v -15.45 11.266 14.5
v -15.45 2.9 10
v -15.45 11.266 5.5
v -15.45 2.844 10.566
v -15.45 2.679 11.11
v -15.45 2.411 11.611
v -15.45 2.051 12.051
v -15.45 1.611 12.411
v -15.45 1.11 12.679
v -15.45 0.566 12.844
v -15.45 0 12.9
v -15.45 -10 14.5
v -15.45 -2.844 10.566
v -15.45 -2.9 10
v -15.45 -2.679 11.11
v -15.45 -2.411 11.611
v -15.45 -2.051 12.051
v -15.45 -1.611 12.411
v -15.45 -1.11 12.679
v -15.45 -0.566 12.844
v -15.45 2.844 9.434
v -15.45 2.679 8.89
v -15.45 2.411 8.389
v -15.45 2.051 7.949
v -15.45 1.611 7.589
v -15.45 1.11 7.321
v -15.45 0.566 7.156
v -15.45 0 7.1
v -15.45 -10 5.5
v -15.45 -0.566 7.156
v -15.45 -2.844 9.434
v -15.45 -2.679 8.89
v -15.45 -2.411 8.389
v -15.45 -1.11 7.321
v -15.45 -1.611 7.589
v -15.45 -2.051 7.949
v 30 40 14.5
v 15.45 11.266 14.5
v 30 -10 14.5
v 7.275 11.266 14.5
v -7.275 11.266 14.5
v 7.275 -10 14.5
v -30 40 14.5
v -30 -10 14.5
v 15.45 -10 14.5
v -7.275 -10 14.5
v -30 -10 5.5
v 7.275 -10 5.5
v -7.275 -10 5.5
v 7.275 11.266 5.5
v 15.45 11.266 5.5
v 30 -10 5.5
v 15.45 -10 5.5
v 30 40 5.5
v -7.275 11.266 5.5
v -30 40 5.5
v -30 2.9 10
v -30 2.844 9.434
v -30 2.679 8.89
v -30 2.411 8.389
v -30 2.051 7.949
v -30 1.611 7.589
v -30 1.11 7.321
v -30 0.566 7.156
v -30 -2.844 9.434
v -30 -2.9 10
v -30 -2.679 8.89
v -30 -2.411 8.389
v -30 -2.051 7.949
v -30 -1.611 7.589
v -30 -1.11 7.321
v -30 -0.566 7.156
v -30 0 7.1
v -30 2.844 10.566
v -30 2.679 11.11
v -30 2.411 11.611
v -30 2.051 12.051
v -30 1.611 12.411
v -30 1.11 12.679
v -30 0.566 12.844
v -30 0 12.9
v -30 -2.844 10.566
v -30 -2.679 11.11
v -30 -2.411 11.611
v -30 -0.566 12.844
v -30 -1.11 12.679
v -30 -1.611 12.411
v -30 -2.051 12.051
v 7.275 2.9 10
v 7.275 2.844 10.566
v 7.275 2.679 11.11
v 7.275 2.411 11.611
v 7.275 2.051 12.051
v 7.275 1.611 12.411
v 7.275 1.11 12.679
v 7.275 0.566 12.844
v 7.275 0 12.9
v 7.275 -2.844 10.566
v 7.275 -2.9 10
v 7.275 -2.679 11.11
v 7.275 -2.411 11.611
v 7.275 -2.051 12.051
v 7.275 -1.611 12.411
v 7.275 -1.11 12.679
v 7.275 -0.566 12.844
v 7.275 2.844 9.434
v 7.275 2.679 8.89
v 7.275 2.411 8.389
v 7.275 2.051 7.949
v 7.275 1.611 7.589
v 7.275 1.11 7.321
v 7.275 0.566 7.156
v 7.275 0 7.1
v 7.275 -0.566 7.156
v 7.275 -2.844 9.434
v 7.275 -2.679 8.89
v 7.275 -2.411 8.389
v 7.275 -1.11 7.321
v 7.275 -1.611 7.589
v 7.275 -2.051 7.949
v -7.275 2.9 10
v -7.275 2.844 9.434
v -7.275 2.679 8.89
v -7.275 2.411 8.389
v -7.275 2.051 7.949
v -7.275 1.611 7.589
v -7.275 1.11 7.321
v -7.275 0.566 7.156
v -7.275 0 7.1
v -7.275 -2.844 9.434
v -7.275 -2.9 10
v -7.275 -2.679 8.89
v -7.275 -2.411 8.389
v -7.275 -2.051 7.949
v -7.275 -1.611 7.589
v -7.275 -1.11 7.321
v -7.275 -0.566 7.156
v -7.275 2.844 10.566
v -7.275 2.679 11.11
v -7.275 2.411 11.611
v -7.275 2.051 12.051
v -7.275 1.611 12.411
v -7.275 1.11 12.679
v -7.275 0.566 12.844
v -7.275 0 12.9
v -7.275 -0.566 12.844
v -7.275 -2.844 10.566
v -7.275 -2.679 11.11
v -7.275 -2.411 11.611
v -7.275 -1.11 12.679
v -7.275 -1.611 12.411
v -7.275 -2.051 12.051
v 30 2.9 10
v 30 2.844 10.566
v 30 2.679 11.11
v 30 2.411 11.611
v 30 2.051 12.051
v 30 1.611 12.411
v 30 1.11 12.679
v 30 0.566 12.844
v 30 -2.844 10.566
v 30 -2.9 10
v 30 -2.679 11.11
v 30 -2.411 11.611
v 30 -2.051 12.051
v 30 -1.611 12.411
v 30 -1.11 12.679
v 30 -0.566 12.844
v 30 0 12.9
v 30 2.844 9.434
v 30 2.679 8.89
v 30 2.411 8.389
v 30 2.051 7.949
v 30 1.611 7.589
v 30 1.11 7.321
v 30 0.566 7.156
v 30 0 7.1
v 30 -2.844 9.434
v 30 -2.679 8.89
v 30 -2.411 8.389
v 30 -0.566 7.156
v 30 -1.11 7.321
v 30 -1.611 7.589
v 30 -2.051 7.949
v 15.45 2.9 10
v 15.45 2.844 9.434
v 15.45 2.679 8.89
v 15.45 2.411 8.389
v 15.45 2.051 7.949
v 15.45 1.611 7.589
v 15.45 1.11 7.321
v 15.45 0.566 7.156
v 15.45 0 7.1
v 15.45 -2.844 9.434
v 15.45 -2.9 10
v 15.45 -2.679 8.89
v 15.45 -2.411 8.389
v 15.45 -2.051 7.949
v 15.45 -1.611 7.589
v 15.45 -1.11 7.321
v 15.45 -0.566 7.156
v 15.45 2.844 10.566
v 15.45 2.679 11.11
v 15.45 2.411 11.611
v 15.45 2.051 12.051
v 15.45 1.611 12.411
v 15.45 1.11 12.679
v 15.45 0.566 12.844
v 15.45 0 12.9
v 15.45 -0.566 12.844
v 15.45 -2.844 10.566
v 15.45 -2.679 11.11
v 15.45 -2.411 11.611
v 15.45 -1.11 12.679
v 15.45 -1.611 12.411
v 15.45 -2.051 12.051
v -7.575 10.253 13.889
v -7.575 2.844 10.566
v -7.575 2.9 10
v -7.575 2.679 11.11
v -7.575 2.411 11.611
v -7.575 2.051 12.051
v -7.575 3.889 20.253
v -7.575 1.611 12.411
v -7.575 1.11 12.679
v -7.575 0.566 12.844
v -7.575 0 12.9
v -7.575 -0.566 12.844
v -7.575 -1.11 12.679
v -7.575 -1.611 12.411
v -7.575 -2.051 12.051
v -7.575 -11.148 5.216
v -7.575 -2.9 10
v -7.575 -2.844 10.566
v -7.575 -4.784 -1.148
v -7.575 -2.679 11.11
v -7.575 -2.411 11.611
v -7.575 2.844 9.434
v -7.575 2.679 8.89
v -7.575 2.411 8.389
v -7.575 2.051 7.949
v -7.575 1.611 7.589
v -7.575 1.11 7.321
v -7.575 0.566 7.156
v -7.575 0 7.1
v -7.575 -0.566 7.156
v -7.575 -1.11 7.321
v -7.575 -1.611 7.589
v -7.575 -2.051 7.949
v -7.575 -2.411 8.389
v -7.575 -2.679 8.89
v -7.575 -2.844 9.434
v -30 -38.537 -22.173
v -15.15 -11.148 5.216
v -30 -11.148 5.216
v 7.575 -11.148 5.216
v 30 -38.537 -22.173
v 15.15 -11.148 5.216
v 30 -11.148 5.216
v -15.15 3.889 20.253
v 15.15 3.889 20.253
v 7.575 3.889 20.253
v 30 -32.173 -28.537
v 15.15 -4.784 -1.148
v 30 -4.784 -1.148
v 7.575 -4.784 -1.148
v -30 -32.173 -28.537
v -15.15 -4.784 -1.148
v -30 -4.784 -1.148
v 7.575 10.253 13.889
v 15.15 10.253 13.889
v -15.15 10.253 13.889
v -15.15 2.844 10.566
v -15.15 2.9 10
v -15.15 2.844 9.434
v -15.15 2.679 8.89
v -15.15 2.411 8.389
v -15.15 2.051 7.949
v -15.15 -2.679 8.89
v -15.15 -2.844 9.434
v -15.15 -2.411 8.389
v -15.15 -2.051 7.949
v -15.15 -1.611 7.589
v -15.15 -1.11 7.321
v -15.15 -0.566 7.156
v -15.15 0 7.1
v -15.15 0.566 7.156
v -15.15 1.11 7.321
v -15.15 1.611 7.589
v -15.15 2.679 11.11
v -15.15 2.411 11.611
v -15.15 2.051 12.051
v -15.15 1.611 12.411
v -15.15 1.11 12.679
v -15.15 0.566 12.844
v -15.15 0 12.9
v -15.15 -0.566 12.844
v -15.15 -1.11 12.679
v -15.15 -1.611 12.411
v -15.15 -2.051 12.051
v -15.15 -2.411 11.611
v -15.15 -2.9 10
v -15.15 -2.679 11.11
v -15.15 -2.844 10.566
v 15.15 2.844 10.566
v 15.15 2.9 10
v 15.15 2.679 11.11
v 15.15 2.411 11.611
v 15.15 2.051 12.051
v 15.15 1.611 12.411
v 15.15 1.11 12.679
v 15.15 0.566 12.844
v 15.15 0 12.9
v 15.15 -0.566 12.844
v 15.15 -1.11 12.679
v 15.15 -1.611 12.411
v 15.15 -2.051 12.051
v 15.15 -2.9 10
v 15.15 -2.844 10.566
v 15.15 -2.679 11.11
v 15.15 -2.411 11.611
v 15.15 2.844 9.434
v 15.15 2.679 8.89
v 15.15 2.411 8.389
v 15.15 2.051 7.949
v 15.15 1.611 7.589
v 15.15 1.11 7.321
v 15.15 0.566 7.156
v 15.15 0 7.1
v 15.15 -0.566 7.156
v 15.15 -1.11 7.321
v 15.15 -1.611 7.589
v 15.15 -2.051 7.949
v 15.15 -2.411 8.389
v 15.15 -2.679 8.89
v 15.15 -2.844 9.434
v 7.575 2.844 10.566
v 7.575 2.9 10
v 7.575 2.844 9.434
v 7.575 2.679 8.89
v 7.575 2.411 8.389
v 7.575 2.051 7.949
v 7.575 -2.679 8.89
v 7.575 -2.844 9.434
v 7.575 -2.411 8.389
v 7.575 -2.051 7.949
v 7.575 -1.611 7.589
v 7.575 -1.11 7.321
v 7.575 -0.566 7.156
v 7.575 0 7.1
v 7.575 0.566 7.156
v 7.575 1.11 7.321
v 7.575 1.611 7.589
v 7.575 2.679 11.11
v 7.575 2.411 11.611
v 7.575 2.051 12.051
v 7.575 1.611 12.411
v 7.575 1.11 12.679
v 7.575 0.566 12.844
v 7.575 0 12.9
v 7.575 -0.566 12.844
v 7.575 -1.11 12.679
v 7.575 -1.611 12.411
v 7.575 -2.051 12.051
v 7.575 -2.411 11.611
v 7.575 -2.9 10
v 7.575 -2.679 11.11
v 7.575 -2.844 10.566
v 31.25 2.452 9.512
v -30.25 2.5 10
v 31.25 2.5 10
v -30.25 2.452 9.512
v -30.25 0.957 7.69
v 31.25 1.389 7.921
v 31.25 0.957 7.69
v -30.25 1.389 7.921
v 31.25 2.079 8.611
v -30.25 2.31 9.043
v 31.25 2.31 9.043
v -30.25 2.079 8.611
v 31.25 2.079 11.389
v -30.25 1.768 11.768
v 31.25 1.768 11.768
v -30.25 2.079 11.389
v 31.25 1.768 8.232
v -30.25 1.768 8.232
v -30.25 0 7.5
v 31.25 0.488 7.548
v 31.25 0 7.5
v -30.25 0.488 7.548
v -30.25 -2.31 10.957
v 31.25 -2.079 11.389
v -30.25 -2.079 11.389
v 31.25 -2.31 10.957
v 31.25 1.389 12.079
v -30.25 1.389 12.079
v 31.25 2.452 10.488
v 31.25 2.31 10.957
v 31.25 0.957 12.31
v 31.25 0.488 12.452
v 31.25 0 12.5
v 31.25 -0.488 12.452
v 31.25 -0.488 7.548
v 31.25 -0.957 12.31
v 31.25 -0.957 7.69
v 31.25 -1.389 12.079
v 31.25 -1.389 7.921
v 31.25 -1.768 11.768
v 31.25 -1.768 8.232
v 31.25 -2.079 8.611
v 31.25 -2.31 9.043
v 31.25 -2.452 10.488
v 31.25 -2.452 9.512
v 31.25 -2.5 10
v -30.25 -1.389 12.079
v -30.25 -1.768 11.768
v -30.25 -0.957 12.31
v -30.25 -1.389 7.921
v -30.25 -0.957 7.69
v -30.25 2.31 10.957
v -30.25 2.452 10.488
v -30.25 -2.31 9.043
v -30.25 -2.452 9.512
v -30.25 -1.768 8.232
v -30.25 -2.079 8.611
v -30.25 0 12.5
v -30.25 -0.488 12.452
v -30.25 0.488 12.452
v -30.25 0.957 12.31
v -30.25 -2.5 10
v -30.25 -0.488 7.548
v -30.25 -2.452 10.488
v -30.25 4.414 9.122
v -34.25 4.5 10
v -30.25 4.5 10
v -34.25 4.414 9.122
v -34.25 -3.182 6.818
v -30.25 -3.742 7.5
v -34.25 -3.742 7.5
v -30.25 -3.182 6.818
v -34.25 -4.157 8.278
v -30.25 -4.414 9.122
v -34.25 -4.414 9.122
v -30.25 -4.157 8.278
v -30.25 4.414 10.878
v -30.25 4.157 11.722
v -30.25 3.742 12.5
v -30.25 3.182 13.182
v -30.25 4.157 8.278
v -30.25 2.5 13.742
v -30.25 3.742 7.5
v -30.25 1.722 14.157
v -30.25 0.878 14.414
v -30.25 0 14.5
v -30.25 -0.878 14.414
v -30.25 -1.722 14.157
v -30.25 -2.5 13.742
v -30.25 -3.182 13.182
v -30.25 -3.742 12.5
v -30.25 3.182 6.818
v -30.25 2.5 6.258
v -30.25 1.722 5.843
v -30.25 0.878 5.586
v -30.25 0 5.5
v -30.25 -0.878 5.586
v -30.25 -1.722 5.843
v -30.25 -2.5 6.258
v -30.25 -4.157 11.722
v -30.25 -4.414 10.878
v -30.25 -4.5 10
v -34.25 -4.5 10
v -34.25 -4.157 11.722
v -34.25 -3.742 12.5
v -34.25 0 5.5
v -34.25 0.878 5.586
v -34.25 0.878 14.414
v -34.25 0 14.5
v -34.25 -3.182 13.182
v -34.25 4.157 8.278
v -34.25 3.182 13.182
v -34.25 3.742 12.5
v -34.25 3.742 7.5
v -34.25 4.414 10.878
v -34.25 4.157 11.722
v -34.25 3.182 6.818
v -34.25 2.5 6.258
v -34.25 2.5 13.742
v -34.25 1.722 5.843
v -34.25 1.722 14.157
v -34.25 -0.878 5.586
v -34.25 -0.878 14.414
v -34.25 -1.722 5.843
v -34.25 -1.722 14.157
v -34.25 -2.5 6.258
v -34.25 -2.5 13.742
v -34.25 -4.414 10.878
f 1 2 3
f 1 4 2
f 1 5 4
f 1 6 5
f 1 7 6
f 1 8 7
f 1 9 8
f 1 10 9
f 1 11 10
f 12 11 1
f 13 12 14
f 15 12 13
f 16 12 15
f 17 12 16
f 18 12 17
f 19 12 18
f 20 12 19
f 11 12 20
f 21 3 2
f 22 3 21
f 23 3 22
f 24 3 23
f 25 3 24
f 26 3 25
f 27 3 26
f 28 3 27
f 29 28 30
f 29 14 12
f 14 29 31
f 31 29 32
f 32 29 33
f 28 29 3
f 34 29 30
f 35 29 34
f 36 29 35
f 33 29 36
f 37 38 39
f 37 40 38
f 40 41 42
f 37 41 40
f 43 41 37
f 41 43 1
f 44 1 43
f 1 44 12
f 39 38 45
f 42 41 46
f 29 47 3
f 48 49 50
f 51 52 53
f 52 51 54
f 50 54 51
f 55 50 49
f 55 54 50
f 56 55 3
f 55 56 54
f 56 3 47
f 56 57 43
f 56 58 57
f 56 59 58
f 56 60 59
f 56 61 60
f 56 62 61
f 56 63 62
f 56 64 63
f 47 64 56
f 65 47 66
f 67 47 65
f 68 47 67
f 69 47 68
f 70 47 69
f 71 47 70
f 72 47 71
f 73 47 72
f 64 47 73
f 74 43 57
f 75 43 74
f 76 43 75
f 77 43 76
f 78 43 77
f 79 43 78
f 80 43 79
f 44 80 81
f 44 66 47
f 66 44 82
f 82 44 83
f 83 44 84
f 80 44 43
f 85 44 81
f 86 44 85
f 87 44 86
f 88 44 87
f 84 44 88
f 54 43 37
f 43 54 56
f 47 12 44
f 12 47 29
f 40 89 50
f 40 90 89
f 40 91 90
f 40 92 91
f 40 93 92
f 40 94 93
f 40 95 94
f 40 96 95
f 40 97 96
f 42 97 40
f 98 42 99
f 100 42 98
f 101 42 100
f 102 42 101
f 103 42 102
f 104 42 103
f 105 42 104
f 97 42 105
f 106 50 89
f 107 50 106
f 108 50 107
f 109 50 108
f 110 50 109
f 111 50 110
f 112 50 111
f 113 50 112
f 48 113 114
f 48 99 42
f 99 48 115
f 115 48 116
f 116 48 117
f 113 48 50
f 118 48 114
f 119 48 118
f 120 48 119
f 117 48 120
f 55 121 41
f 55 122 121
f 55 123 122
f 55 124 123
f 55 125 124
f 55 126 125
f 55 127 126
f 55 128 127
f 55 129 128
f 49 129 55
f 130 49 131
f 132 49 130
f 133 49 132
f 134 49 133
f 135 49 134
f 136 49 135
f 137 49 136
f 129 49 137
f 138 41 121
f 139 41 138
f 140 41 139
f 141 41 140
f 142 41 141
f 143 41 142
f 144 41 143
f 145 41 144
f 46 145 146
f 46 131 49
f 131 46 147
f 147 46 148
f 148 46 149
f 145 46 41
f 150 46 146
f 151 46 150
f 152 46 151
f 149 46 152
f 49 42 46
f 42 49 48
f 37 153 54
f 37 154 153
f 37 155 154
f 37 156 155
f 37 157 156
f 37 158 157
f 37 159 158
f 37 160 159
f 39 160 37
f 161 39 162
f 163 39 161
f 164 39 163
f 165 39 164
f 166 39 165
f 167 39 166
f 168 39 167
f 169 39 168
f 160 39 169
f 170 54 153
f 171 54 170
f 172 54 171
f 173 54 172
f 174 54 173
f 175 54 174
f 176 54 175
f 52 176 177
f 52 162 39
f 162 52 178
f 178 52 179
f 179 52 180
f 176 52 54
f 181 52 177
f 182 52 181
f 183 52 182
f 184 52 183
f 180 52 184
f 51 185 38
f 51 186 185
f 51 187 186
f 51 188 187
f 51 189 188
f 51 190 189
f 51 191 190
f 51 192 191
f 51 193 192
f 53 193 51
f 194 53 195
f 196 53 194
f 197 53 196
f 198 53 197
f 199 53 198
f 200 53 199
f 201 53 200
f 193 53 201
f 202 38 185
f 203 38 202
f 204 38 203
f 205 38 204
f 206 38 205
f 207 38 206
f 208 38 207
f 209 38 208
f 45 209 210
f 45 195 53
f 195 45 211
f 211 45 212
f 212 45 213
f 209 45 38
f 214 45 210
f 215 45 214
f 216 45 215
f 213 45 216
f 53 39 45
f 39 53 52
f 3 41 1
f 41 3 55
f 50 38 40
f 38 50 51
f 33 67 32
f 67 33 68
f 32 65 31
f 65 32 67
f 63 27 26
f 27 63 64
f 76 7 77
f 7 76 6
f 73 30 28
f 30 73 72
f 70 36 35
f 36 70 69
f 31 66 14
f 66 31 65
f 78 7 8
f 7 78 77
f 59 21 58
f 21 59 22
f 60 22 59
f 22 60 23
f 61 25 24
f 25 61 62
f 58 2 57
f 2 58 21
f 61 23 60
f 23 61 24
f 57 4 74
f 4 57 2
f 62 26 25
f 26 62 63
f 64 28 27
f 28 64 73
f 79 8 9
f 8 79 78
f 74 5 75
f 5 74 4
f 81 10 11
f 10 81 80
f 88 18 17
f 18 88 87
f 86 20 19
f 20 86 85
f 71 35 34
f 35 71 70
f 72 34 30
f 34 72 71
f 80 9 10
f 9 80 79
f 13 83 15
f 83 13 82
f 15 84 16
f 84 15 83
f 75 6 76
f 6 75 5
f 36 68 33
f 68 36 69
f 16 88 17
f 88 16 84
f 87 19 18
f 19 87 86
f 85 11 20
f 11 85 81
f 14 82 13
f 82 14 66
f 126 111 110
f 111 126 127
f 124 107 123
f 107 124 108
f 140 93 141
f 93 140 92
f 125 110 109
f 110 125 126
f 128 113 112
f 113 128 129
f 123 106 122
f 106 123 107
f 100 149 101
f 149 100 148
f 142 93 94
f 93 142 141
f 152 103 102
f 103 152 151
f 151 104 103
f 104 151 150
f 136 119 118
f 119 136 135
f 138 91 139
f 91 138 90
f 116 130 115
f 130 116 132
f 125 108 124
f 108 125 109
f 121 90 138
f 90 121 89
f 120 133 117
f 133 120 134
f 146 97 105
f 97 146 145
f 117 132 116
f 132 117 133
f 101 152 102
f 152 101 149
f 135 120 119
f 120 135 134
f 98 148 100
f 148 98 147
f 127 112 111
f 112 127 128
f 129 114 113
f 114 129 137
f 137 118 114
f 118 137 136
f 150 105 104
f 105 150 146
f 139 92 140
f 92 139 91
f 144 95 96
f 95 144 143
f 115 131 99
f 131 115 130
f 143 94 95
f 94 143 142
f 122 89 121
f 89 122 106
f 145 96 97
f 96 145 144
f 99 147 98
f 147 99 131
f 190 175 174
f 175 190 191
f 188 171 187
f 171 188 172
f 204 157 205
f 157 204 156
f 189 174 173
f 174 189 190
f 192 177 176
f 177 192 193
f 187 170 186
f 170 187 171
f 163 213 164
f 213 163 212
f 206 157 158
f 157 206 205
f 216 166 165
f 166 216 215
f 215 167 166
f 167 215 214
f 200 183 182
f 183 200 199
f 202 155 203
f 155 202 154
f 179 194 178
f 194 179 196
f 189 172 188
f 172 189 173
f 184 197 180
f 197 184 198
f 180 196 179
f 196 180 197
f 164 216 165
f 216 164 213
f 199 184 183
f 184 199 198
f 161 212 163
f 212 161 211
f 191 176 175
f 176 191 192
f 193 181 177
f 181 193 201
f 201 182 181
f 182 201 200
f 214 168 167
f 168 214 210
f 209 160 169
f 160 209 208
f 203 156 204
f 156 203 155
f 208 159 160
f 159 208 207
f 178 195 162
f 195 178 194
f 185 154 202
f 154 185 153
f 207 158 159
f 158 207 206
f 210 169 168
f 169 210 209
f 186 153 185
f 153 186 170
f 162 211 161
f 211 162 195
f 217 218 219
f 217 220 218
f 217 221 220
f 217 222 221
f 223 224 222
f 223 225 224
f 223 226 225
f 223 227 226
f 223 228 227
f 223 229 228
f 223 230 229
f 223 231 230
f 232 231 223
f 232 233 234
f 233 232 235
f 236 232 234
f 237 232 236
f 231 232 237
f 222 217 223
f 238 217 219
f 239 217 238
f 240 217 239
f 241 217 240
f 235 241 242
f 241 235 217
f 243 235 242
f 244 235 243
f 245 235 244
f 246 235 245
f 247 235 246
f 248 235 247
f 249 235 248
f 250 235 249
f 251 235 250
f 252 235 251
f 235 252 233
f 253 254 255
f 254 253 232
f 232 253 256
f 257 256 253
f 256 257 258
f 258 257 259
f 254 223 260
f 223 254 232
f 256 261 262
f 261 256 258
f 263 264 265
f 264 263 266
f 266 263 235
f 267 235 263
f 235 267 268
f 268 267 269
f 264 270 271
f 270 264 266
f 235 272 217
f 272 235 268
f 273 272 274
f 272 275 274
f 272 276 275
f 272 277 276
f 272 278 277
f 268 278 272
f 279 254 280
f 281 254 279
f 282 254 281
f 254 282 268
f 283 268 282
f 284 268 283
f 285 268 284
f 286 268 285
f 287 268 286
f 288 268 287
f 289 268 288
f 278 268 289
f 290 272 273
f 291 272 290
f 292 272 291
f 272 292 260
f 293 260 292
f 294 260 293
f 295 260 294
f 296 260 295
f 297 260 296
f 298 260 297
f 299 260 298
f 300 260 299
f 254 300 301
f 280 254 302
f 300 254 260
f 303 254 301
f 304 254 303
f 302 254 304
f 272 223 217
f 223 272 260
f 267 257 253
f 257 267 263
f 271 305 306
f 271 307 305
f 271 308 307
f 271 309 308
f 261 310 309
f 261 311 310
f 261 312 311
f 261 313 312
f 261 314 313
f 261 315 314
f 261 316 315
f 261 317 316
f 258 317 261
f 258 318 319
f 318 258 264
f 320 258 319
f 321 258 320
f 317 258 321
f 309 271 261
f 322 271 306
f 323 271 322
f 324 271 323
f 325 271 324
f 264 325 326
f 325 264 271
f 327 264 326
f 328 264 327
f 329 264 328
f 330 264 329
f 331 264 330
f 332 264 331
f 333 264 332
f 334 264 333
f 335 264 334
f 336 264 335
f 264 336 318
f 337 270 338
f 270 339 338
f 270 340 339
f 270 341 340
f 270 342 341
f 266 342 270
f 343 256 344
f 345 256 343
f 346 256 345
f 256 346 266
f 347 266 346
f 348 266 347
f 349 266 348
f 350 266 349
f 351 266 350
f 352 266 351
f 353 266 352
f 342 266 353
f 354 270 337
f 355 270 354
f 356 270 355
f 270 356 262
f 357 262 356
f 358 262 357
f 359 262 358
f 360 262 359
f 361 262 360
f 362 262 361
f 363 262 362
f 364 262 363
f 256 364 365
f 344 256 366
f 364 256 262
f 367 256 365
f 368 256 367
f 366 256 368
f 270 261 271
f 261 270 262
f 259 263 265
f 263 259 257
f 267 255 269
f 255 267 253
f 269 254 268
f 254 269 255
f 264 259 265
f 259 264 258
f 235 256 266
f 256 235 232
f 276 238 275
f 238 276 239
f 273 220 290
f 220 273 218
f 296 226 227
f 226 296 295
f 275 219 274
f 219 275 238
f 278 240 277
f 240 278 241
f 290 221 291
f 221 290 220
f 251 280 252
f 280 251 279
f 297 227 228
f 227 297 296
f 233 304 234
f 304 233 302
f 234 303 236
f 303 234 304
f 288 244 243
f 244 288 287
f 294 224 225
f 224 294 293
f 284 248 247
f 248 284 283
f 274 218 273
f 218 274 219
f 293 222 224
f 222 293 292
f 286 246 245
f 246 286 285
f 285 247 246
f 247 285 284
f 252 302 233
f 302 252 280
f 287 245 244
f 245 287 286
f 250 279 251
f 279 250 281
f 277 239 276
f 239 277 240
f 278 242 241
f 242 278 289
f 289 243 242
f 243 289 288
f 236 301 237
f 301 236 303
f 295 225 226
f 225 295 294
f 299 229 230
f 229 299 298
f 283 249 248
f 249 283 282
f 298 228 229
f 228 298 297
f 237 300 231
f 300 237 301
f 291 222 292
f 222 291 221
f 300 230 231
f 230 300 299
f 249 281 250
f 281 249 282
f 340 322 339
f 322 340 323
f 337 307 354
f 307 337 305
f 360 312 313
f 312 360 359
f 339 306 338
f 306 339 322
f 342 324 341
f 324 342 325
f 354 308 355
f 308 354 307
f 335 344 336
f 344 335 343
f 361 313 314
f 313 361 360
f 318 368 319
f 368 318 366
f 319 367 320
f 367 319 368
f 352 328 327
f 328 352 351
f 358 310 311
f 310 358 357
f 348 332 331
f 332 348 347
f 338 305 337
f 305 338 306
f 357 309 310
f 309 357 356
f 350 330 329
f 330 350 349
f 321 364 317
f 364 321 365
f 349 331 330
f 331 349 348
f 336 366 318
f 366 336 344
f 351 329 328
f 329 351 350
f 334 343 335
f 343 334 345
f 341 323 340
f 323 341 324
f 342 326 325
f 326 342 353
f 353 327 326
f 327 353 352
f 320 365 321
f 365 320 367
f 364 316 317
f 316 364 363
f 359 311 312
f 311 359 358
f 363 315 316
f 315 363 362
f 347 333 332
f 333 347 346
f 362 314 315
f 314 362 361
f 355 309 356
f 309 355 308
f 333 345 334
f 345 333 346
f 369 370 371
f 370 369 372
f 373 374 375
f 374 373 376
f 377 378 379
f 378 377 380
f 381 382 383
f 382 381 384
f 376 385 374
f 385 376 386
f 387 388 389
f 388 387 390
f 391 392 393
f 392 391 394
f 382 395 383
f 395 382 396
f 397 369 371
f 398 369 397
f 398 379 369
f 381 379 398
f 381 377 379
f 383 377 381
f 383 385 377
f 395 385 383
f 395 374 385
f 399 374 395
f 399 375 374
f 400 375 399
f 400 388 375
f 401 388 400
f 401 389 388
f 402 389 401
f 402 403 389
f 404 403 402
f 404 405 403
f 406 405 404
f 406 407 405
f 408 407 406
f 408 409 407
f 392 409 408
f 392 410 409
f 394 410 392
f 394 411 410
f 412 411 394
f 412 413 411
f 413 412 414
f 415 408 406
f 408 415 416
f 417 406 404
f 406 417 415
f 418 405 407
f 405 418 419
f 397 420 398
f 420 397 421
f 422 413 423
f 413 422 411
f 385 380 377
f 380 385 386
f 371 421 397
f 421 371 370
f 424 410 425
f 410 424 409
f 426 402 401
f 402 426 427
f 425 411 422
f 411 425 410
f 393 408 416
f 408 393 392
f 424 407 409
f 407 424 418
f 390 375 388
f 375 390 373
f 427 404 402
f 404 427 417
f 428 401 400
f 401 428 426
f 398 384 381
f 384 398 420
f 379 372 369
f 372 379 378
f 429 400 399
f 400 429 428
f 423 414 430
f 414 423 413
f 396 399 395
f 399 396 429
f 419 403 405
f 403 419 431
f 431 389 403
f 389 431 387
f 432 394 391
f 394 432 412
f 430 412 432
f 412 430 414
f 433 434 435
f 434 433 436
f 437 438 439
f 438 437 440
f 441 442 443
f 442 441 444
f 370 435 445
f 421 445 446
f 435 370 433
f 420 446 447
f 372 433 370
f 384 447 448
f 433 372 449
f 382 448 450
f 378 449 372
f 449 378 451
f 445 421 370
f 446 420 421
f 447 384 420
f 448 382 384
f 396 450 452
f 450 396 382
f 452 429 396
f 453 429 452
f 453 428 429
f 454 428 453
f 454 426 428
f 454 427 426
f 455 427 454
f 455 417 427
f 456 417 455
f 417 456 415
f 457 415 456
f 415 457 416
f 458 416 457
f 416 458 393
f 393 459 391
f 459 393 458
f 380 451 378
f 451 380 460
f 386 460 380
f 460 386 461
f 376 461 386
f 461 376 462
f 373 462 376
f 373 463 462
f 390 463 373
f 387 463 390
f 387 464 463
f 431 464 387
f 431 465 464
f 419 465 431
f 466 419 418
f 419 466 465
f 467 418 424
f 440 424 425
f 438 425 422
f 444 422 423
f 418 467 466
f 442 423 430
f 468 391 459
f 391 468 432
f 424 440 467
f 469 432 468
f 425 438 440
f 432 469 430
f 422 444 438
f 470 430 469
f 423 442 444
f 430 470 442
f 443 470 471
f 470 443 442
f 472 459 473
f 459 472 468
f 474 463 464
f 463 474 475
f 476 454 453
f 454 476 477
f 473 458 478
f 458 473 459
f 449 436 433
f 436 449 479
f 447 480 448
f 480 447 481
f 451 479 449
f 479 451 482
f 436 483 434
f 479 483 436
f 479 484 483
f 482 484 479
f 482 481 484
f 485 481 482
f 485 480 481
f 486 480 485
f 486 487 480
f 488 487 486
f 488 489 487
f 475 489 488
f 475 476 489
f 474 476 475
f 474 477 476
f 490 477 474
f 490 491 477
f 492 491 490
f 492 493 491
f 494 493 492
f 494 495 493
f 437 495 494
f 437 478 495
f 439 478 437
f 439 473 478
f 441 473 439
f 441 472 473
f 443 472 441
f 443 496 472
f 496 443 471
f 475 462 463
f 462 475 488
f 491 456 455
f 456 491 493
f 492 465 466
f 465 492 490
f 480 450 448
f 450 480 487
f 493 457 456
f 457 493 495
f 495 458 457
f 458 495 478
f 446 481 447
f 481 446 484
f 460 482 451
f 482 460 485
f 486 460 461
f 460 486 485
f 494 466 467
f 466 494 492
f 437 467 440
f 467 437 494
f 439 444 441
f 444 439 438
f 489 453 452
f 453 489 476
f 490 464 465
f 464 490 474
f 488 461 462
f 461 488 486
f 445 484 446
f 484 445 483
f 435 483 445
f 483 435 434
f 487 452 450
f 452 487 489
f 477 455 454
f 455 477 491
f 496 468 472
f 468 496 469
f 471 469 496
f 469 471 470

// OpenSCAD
$fn = 32;

// ------------------------------------------------------------------------
// Butt hinge: hinge 60 mm, leaf swung 45 deg
// Every part is its own module, assembly() places every instance.
// ------------------------------------------------------------------------

// --- part 1 ---
module hinge_base() {
  difference() {
    union() {
      translate([-30, -10, -4.5]) cube([14.55, 50, 9]);
      translate([-7.275, -10, -4.5]) cube([14.55, 50, 9]);
      translate([15.45, -10, -4.5]) cube([14.55, 50, 9]);
      translate([-30, 11.266, -4.5]) cube([60, 28.734, 9]);
    }
    translate([-22.725, 0, 0]) rotate([0, 90, 0]) cylinder(h = 16.55, d = 5.8, center = true);
    translate([0, 0, 0]) rotate([0, 90, 0]) cylinder(h = 16.55, d = 5.8, center = true);
    translate([22.725, 0, 0]) rotate([0, 90, 0]) cylinder(h = 16.55, d = 5.8, center = true);
  }
}

// --- part 2 ---
module hinge_mover() {
  difference() {
    union() {
      translate([-15.15, -50, -4.5]) cube([7.575, 60, 9]);
      translate([7.575, -50, -4.5]) cube([7.575, 60, 9]);
      translate([-30, -50, -4.5]) cube([60, 38.734, 9]);
    }
    translate([-11.362, 0, 0]) rotate([0, 90, 0]) cylinder(h = 9.575, d = 5.8, center = true);
    translate([11.362, 0, 0]) rotate([0, 90, 0]) cylinder(h = 9.575, d = 5.8, center = true);
  }
}

// --- part 3 ---
module hinge_pin() {
  rotate([0, 90, 0]) cylinder(h = 62.5, d = 5, center = true);
  translate([-34.25, 0, 0]) rotate([0, 90, 0]) cylinder(h = 4, d = 9);
}

// --- assembly ---
module assembly() {
  color([0.80, 0.24, 0.20]) translate([0, 0, 10]) rotate([0, 0, 0]) hinge_base();
  color([0.20, 0.45, 0.75]) translate([0, 0, 10]) rotate([45, 0, 0]) hinge_mover();
  color([0.25, 0.62, 0.32]) translate([0, 0, 10]) rotate([0, 0, 0]) hinge_pin();
}

assembly();
